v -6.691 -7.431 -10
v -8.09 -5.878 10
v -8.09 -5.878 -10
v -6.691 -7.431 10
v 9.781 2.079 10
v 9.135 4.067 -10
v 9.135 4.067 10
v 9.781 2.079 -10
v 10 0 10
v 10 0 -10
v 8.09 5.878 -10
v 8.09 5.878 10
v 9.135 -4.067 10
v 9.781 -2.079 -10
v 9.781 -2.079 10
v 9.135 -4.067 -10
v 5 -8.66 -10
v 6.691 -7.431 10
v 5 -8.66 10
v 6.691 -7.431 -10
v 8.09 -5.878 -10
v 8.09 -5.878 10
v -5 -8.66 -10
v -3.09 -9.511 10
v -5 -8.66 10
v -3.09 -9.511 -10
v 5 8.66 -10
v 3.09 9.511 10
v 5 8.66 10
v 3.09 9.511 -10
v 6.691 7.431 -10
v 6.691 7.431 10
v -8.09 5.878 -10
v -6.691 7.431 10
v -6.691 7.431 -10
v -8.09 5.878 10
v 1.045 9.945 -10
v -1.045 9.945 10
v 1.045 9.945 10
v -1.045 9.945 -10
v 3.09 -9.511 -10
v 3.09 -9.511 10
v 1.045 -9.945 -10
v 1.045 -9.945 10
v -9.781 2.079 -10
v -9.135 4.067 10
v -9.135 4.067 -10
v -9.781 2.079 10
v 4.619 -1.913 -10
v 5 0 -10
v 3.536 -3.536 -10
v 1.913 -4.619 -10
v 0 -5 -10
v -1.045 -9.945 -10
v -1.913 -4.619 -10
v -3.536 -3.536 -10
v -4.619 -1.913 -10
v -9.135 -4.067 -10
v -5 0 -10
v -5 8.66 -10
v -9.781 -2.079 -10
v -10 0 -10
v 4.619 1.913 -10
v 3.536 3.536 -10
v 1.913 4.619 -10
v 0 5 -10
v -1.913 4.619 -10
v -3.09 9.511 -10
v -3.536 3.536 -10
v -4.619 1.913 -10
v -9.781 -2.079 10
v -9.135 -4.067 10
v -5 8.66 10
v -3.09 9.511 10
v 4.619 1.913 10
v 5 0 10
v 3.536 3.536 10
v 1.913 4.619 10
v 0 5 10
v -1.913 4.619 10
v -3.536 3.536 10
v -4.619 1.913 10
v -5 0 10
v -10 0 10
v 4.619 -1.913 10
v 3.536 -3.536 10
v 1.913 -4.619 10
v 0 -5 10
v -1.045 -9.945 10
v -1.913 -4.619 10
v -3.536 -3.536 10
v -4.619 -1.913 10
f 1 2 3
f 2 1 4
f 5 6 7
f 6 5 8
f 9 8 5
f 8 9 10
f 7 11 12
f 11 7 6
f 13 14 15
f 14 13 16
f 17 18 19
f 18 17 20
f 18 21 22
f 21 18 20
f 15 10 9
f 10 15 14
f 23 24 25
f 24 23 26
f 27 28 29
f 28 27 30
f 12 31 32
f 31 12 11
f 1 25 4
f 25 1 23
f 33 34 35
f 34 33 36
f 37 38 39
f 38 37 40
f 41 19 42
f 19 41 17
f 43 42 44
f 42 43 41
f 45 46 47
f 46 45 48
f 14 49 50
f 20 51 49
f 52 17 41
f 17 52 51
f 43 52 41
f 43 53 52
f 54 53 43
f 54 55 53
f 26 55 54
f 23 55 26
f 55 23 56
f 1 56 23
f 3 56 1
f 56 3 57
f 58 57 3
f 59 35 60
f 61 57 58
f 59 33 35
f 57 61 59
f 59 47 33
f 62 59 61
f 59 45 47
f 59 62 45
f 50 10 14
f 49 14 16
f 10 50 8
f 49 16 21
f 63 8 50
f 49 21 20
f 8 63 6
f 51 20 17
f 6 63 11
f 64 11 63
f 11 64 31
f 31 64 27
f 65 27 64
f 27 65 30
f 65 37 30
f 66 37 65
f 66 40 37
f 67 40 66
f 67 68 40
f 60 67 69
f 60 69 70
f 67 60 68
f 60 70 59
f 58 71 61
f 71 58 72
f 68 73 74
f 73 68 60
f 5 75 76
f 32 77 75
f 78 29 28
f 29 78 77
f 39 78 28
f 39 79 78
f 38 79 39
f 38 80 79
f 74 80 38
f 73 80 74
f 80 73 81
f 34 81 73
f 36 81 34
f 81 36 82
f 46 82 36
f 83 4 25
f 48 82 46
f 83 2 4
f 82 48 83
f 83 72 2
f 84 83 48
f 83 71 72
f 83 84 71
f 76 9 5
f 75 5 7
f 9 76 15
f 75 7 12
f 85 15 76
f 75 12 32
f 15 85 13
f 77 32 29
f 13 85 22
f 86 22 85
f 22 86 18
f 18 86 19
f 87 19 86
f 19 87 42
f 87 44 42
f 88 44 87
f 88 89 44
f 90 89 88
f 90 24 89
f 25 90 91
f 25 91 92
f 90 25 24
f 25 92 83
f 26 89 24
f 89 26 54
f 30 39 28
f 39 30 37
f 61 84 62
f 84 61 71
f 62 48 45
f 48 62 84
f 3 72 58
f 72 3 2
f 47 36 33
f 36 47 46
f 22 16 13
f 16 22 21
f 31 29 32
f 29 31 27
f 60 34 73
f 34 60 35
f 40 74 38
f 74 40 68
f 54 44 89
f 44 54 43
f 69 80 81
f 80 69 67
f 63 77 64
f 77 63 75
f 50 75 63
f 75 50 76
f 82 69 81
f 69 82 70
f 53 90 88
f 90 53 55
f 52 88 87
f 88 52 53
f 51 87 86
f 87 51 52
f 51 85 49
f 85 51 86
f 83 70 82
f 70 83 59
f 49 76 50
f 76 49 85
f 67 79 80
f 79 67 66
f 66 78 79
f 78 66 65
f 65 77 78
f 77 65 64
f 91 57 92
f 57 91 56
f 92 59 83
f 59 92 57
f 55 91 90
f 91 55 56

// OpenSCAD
//  Plastic Spacer v1.0 by areeve20



//	Measurement of spacer thickness
h_measurement = 20;	//	[0:200]

//  Measurement addition (Fine-tune Thickness)
ha_measurement = 0;  //  [0,0.1,0.2,0.3,0.4,0.5,0.6,0.7,0.8,0.9]

//	Measurement of spacer diameter
D1_measurement = 10;	//	[2:200]

//  Measurement addition (Fine-tune Diameter1)
D1a_measurement = 0;  //  [0,0.1,0.2,0.3,0.4,0.5,0.6,0.7,0.8,0.9]

//  Measurement of spacer hole
D2_measurement = 5; //  [1:200]

//  Measurement addition (Fine-tune Diameter2)
D2a_measurement = 0;  //  [0,0.1,0.2,0.3,0.4,0.5,0.6,0.7,0.8,0.9]



//	This is the spacer we've (hopefully) customized!

difference(){
translate([0,0,0]) cylinder(h_measurement+ha_measurement, D1_measurement+D1a_measurement, D1_measurement+D1a_measurement, center=true);

translate([0,0,0]) cylinder(h_measurement*2, D2_measurement+D2a_measurement, D2_measurement+D1a_measurement, center=true);
}
